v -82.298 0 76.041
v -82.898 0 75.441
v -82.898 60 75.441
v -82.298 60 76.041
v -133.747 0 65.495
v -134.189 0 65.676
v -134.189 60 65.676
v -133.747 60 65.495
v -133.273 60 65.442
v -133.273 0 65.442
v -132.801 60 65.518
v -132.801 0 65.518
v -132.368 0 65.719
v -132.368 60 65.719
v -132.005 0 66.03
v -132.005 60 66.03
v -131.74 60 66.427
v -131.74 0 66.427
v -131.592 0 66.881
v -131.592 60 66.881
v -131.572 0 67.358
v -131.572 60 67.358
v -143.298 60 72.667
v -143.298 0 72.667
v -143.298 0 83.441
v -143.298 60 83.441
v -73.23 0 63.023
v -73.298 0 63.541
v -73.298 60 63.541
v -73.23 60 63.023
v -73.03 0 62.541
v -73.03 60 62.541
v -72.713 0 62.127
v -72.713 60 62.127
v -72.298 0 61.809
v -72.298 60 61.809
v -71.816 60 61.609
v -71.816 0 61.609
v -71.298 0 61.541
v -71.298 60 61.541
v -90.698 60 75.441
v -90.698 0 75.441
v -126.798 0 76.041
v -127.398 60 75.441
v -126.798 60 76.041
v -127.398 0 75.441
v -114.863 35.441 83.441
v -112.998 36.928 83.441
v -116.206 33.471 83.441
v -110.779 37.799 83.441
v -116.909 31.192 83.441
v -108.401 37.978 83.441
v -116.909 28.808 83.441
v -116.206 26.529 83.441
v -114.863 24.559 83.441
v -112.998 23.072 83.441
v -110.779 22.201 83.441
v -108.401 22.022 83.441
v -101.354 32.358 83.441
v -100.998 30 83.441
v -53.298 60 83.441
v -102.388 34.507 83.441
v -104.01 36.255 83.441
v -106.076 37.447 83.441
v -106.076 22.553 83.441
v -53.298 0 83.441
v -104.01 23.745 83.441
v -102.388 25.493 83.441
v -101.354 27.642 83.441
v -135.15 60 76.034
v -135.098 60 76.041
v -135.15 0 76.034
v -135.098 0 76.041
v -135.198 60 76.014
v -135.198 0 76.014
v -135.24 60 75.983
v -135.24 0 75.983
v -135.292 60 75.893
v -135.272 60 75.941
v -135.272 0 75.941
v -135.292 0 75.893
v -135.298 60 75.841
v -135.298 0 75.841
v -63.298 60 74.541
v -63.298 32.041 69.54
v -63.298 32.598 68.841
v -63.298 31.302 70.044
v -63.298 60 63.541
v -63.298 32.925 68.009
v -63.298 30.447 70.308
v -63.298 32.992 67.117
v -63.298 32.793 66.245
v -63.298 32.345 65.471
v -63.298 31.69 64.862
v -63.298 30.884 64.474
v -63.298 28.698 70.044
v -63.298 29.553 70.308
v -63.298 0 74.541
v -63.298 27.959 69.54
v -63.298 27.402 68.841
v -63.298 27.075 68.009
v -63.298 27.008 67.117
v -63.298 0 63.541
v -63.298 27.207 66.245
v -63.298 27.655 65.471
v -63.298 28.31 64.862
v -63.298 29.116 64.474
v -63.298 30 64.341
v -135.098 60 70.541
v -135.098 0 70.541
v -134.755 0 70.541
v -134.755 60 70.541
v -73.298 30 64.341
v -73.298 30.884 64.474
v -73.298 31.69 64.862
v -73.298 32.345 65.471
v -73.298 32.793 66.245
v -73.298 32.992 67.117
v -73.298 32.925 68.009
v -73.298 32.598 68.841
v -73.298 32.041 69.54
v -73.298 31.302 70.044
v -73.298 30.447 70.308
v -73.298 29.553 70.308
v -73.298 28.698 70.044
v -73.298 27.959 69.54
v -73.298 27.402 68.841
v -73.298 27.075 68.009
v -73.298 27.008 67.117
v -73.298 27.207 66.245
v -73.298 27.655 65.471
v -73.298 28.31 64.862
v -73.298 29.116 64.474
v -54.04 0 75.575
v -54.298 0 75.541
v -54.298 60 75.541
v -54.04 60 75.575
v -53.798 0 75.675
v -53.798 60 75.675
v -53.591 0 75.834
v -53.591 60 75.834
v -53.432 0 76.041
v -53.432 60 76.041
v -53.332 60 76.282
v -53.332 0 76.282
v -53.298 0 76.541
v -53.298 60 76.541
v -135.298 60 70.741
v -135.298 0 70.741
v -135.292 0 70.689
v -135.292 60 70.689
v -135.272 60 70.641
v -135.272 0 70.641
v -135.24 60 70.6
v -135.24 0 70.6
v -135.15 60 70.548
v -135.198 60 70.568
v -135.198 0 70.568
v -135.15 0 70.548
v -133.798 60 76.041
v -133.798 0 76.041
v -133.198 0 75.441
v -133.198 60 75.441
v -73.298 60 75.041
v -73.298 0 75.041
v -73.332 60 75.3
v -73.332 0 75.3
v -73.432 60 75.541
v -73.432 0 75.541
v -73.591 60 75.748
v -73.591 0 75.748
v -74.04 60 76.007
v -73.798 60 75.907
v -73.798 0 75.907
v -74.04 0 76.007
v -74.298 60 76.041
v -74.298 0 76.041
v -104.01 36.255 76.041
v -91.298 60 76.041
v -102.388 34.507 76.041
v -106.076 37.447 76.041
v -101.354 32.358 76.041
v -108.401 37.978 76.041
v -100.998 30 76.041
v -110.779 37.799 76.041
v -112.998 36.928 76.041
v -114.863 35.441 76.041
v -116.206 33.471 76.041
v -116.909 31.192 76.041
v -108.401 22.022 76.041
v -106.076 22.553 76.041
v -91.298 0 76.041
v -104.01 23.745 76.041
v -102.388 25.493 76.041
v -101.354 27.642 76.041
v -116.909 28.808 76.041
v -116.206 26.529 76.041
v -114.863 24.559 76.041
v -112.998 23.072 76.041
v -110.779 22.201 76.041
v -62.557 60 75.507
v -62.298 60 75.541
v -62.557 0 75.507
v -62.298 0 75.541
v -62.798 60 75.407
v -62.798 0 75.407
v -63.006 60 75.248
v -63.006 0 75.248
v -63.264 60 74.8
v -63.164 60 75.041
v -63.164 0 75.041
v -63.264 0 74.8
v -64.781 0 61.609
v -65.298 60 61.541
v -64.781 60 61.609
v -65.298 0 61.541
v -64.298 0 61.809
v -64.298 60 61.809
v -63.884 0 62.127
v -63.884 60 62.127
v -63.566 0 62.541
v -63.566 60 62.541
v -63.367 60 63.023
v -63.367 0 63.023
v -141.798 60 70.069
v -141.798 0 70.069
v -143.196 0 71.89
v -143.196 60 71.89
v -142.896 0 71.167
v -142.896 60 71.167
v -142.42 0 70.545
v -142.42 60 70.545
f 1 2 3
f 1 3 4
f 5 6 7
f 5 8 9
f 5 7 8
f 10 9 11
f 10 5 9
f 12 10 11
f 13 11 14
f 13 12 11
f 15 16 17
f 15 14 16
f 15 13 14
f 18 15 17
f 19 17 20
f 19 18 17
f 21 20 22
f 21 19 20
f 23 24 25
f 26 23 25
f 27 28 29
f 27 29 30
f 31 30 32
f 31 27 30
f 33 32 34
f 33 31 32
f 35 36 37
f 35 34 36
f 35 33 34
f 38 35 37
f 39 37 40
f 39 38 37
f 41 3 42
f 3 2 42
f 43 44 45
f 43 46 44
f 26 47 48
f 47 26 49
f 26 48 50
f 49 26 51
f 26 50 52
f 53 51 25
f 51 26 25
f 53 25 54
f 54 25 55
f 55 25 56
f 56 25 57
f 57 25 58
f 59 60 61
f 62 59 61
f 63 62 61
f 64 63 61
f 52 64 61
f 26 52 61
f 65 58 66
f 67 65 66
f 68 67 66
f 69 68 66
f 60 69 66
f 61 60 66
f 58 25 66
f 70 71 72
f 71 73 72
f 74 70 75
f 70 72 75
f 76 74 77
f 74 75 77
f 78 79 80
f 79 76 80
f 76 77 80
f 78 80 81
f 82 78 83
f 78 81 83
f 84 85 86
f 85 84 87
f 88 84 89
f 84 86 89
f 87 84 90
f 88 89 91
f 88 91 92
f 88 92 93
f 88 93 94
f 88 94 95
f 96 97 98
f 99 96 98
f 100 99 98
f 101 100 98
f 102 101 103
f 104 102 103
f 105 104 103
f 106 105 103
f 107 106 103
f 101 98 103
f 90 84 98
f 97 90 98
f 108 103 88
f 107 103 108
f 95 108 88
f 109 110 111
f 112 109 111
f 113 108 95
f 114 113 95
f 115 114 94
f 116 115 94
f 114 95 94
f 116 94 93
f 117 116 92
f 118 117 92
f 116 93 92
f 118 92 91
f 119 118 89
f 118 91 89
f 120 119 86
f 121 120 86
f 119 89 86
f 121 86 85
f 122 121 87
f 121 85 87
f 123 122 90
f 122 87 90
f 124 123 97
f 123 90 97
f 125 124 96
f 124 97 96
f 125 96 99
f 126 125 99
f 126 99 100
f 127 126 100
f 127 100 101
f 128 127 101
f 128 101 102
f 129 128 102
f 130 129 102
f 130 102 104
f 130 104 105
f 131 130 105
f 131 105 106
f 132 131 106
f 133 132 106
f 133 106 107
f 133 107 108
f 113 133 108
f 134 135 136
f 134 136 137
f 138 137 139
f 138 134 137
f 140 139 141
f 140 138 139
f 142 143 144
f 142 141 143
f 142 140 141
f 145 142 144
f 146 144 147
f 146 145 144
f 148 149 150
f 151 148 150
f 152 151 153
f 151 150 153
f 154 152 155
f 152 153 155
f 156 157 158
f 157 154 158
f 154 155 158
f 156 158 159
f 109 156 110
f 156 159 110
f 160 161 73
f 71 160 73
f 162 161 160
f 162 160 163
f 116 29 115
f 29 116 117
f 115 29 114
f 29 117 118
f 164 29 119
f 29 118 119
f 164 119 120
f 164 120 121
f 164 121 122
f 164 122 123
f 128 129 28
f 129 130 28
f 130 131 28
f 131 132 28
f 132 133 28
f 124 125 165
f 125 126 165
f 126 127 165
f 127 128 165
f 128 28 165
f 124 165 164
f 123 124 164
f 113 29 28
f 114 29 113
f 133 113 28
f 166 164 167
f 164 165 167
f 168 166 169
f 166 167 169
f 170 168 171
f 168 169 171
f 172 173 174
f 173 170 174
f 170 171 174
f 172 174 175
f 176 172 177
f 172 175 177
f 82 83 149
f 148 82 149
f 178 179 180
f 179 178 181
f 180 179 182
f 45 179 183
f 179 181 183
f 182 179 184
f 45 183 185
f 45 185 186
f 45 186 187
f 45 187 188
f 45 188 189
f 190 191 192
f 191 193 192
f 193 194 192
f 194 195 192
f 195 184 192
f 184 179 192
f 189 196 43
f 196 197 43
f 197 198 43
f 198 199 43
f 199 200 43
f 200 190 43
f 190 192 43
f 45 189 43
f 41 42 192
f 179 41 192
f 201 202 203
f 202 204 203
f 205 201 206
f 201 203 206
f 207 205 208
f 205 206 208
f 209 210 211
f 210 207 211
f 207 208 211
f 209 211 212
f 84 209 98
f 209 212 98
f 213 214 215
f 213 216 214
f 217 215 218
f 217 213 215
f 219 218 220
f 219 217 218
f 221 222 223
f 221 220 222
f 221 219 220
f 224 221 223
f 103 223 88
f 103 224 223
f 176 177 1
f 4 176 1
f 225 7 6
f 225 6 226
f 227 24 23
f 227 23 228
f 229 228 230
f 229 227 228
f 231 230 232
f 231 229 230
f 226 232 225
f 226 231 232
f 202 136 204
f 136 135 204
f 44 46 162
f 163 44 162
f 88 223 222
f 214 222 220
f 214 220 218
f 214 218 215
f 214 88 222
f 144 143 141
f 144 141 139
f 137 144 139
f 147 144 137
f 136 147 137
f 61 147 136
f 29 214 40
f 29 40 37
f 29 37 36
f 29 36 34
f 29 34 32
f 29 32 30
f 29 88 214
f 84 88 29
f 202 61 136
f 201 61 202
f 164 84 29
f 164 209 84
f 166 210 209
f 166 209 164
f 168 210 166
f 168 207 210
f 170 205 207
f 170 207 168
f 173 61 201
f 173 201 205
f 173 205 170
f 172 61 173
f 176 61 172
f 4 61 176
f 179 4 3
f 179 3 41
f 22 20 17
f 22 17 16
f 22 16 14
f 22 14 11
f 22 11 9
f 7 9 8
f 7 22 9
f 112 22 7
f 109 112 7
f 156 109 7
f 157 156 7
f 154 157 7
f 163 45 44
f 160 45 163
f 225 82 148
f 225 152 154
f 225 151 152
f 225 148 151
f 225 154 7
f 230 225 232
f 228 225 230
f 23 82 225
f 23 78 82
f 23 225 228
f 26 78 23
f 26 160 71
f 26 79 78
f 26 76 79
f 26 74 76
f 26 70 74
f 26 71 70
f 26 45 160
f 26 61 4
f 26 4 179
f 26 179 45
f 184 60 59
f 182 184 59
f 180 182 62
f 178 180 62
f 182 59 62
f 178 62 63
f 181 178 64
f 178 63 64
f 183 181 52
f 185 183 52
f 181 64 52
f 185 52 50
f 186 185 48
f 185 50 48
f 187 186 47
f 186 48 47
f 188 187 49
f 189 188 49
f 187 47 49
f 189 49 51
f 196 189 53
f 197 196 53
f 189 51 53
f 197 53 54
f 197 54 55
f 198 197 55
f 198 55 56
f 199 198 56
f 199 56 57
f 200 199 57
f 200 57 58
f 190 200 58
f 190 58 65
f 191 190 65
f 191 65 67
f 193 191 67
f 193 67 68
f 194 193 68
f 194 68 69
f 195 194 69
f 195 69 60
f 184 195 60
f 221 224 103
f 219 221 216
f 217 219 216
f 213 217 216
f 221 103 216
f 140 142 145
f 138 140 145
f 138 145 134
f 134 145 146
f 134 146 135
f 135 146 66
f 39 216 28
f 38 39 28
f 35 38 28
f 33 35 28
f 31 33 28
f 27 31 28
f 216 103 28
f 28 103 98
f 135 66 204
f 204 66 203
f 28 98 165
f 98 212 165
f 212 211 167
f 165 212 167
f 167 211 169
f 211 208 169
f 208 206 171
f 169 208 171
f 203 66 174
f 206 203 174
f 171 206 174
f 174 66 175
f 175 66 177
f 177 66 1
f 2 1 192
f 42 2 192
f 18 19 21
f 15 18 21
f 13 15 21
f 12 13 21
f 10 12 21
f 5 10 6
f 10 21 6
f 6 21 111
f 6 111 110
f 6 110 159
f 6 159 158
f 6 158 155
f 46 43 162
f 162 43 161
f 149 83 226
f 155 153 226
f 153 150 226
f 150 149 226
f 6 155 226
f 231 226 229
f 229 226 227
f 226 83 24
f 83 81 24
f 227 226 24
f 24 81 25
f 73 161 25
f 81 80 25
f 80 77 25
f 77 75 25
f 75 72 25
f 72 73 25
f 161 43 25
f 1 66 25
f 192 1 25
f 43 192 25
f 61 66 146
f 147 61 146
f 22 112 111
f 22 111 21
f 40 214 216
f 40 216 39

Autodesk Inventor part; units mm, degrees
ref_plane "YZ Plane" through (0, 0, 0) normal (1, 0, 0) x (0, 1, 0)
ref_plane "XZ Plane" through (0, 0, 0) normal (0, 1, 0) x (-1, 0, 0)
ref_plane "XY Plane" through (0, 0, 0) normal (0, 0, 1) x (1, 0, 0)
sketch "スケッチ1" plane through (0, 0, 0) normal (0, 1, 0) x (-1, 0, 0)
  line L0 (-49.8489, 61.5411) -> (-49.8489, 83.4411)
  line L1 (-49.8489, 83.4411) -> (10.1511, 83.4411)
  line L2 (10.1511, 83.4411) -> (10.1511, 61.5411)
  line L3 (10.1511, 61.5411) -> (-8.8489, 61.5411)
  line L4 (-8.8489, 56.3412) -> (-8.8489, 74.3411)
  line L5 (-8.8489, 74.3411) -> (-15.9758, 74.3411)
  line L6 (-23.7218, 74.3411) -> (-30.8489, 74.3411)
  line L7 (-30.8489, 74.3411) -> (-30.8489, 56.3412)
  line L8 (-30.8489, 56.3411) -> (-8.8489, 56.3411)
  circle A0 centre (-19.8489, 67.3411) radius 8
  circle A1 centre (-19.8489, 67.3411) radius 7.5
  line L9 (-30.8489, 61.5411) -> (-49.8489, 61.5411)
  line L10 (-49.8489, 75.5411) -> (10.1511, 75.5411)
  line L11 (53.2984, 117.706) -> (53.2984, 177.706)
  line L12 (53.2984, 177.706) -> (143.2984, 177.706)
  line L13 (143.2984, 177.706) -> (143.2984, 117.706)
  line L14 (143.2984, 117.706) -> (53.2984, 117.706)
  circle A2 centre (83.9984, 122.706) radius 1.5
  circle A3 centre (83.9984, 147.706) radius 1.5
  circle A4 centre (93.9984, 147.706) radius 2.25
  circle A5 centre (83.9984, 172.706) radius 1.5
  circle A6 centre (108.9984, 172.706) radius 1.5
  circle A7 centre (133.9984, 172.706) radius 1.5
  circle A8 centre (133.9984, 147.706) radius 1.5
  circle A9 centre (123.9984, 147.706) radius 2.25
  circle A10 centre (108.9984, 147.706) radius 7.5
  circle A11 centre (108.9984, 122.706) radius 1.5
  circle A12 centre (133.9984, 122.706) radius 1.5
  line L15 (174.3262, 83.4411) -> (174.3262, 61.5411)
  line L16 (174.3262, 61.5411) -> (193.3262, 61.5411)
  line L17 (193.3262, 65.4411) -> (193.3262, 56.3412)
  line L18 (193.3262, 56.3411) -> (215.3262, 56.3411)
  line L19 (215.3262, 56.3412) -> (215.3262, 65.4411)
  line L20 (215.3262, 61.5411) -> (234.3263, 61.5411)
  line L21 (234.3263, 61.5411) -> (234.3263, 83.4411)
  line L22 (234.3263, 83.4411) -> (174.3262, 83.4411)
  line L23 (234.3263, 65.4411) -> (174.3262, 65.4411)
  line L24 (143.2984, 25.0403) -> (53.2984, 25.0403)
  line L25 (53.2984, 25.0403) -> (53.2984, -34.9597)
  line L26 (53.2984, -34.9597) -> (143.2984, -34.9597)
  line L27 (143.2984, -34.9597) -> (143.2984, 25.0403)
  line L28 (131.5644, 25.0403) -> (131.5644, -34.9597)
  circle A13 centre (108.9984, -29.9597) radius 1.5
  circle A14 centre (108.9984, -4.9597) radius 7.5
  circle A15 centre (123.9984, -4.9597) radius 2.25
  circle A16 centre (123.9984, -4.9597) radius 4
  circle A17 centre (108.9984, 20.0403) radius 1.5
  circle A18 centre (83.9984, 20.0403) radius 1.5
  line L29 (73.2984, 25.0403) -> (73.2984, 6.0403)
  line L30 (86.3001, -15.9597) -> (86.3001, 6.0403)
  line L31 (86.3001, 6.0403) -> (53.3001, 6.0403)
  line L32 (53.3001, 6.0403) -> (53.3001, -15.9597)
  line L33 (53.3001, -15.9597) -> (86.3001, -15.9597)
  line L34 (73.2984, -15.9597) -> (73.2984, -34.9597)
  line L35 (63.2984, -34.9597) -> (63.2984, -15.9597)
  line L36 (63.2984, 6.0403) -> (63.2984, 25.0403)
  circle A19 centre (83.9984, -29.9597) radius 1.5
  circle A20 centre (93.9984, -4.9597) radius 2.25
  circle A21 centre (93.9984, -4.9597) radius 4
  line L37 (-19.8489, 49.2711) -> (-19.8489, 87.2696)
  line L38 (-6.1616, 67.3411) -> (-35.9585, 67.3411)
  line L39 (83.9984, 23.5784) -> (83.9984, 16.5836)
  circle A22 centre (83.9984, 20.0403) radius 2
  line L40 (80.6576, 20.0403) -> (87.5893, 20.0403)
  line L41 (93.9984, 1.0394) -> (93.9984, -10.6526)
  line L42 (83.9984, -26.503) -> (83.9984, -33.4978)
  circle A23 centre (83.9984, -29.9597) radius 2
  line L43 (80.6576, -29.9597) -> (87.5893, -29.9597)
  line L44 (29.8273, -4.9597) -> (148.6488, -4.9597)
  line L45 (123.9984, -10.6526) -> (123.9984, 1.0394)
  line L46 (112.4368, 20.0403) -> (105.6741, 20.0403)
  circle A24 centre (108.9984, 20.0403) radius 2
  line L47 (108.9984, 32.4142) -> (108.9984, -41.5197)
  circle A25 centre (108.9984, -29.9597) radius 2
  line L48 (105.4074, -29.9597) -> (112.8092, -29.9597)
  circle A26 centre (108.9984, -4.9597) radius 8
  line L49 (108.9984, 111.8823) -> (108.9984, 183.8068)
  circle A27 centre (108.9984, 172.706) radius 2
  line L50 (105.6741, 172.706) -> (112.4368, 172.706)
  line L51 (130.4749, 172.706) -> (137.3391, 172.706)
  circle A28 centre (133.9984, 172.706) radius 2
  line L52 (133.9984, 169.2493) -> (133.9984, 176.2441)
  line L53 (123.9984, 153.3988) -> (123.9984, 141.7069)
  circle A29 centre (123.9984, 147.706) radius 4
  circle A30 centre (133.9984, 147.706) radius 2
  line L54 (133.9984, 151.0572) -> (133.9984, 144.2493)
  line L55 (148.6488, 147.706) -> (29.8273, 147.706)
  circle A31 centre (83.9984, 147.706) radius 2
  line L56 (83.9984, 151.0572) -> (83.9984, 144.2493)
  line L57 (93.9984, 141.7069) -> (93.9984, 153.3988)
  circle A32 centre (93.9984, 147.706) radius 4
  line L58 (83.9984, 169.2493) -> (83.9984, 176.2441)
  circle A33 centre (83.9984, 172.706) radius 2
  line L59 (80.6576, 172.706) -> (87.5893, 172.706)
  circle A34 centre (108.9984, 147.706) radius 8
  circle A35 centre (108.9984, 122.706) radius 2
  line L60 (105.4074, 122.706) -> (112.8092, 122.706)
  line L61 (130.8446, 122.706) -> (137.3391, 122.706)
  circle A36 centre (133.9984, 122.706) radius 2
  line L62 (133.9984, 126.1627) -> (133.9984, 119.1679)
  line L63 (87.5893, 122.706) -> (80.6576, 122.706)
  circle A37 centre (83.9984, 122.706) radius 2
  line L64 (83.9984, 126.1627) -> (83.9984, 119.1679)
  line L65 (204.3262, 87.2696) -> (204.3262, 49.2711)
  line L66 (176.3262, 70.0686) -> (232.3263, 70.0686)
  line L67 (82.1365, 4.0403) -> (82.1365, -13.9597)
  line L68 (51.8001, 144.706) -> (51.8001, 150.706)
  line L69 (53.2984, 150.706) -> (51.8001, 150.706)
  line L70 (53.2984, 144.706) -> (51.8001, 144.706)
  line L71 (33.8001, 155.206) -> (33.8001, 140.206)
  line L72 (33.8001, 140.206) -> (34.3001, 139.706)
  line L73 (34.3001, 139.706) -> (51.3001, 139.706)
  line L74 (51.3001, 139.706) -> (51.8001, 140.206)
  line L75 (51.8001, 140.206) -> (51.8001, 155.206)
  line L76 (51.8001, 155.206) -> (51.3001, 155.706)
  line L77 (51.3001, 155.706) -> (34.3001, 155.706)
  line L78 (34.3001, 155.706) -> (33.8001, 155.206)
  line L79 (34.3001, 155.706) -> (34.3001, 139.706)
  line L80 (51.3001, 139.706) -> (51.3001, 155.706)
  line L81 (51.8001, -7.9597) -> (51.8001, -1.9597)
  line L82 (53.3001, -1.9597) -> (51.8001, -1.9597)
  line L83 (53.3001, -7.9597) -> (51.8001, -7.9597)
  line L84 (33.8001, 2.5403) -> (33.8001, -12.4597)
  line L85 (33.8001, -12.4597) -> (34.3001, -12.9597)
  line L86 (34.3001, -12.9597) -> (51.3001, -12.9597)
  line L87 (51.3001, -12.9597) -> (51.8001, -12.4597)
  line L88 (51.8001, -12.4597) -> (51.8001, 2.5403)
  line L89 (51.8001, 2.5403) -> (51.3001, 3.0403)
  line L90 (51.3001, 3.0403) -> (34.3001, 3.0403)
  line L91 (34.3001, 3.0403) -> (33.8001, 2.5403)
  line L92 (34.3001, 3.0403) -> (34.3001, -12.9597)
  line L93 (51.3001, -12.9597) -> (51.3001, 3.0403)
  line L94 (28.0972, 67.3411) -> (83.3407, 67.3411)
  line L95 (82.8984, 75.4411) -> (90.6984, 75.4411)
  line L96 (127.3984, 75.4411) -> (133.1984, 75.4411)
  line L97 (134.7552, 70.5411) -> (131.5724, 67.3583)
  line L98 (82.4415, 71.3411) -> (86.3001, 67.4825)
  line L99 (78.3001, 69.4911) -> (75.8001, 69.4911)
  line L100 (78.3001, 65.1911) -> (75.8001, 65.1911)
  line L101 (75.8001, 64.8411) -> (75.8001, 69.8411)
  line L102 (75.3001, 70.3411) -> (73.1569, 70.3411)
  line L103 (75.3001, 64.3411) -> (73.1569, 64.3411)
  line L104 (75.8001, 69.8411) -> (73.1569, 69.8411)
  line L105 (75.8001, 64.8411) -> (73.1569, 64.8411)
  line L106 (51.8001, 64.3411) -> (51.8001, 70.3411)
  line L107 (53.3001, 70.3411) -> (51.8001, 70.3411)
  line L108 (53.3001, 64.3411) -> (51.8001, 64.3411)
  line L109 (33.8001, 74.8411) -> (33.8001, 59.8411)
  line L110 (33.8001, 59.8411) -> (34.3001, 59.3411)
  line L111 (34.3001, 59.3411) -> (51.3001, 59.3411)
  line L112 (51.3001, 59.3411) -> (51.8001, 59.8411)
  line L113 (51.8001, 59.8411) -> (51.8001, 74.8411)
  line L114 (51.8001, 74.8411) -> (51.3001, 75.3411)
  line L115 (51.3001, 75.3411) -> (34.3001, 75.3411)
  line L116 (34.3001, 75.3411) -> (33.8001, 74.8411)
  line L117 (34.3001, 75.3411) -> (34.3001, 59.3411)
  line L118 (51.3001, 59.3411) -> (51.3001, 75.3411)
  line L119 (54.3001, 74.3411) -> (60.3001, 74.3411)
  line L120 (54.3001, 56.3411) -> (80.2082, 56.3411)
  line L121 (53.3001, 57.3411) -> (53.3001, 73.3411)
  line L122 (86.3001, 60.5366) -> (86.3001, 67.4825)
  line L123 (61.3001, 62.3411) -> (61.3001, 73.3411)
  line L124 (62.3001, 61.3411) -> (77.3001, 61.3411)
  line L125 (78.3001, 62.3411) -> (78.3001, 70.3411)
  line L126 (79.3001, 71.3411) -> (82.4415, 71.3411)
  line L127 (82.1365, 57.0429) -> (86.3001, 60.5366)
  arc A38 (80.2082, 56.3411) -> (82.1365, 57.0429) centre (80.2082, 59.3411) ccw
  arc A39 (54.3001, 74.3411) -> (53.3001, 73.3411) centre (54.3001, 73.3411) ccw
  arc A40 (61.3001, 73.3411) -> (60.3001, 74.3411) centre (60.3001, 73.3411) ccw
  arc A41 (53.3001, 57.3411) -> (54.3001, 56.3411) centre (54.3001, 57.3411) ccw
  arc A42 (61.3001, 62.3411) -> (62.3001, 61.3411) centre (62.3001, 62.3411) ccw
  arc A43 (77.3001, 61.3411) -> (78.3001, 62.3411) centre (77.3001, 62.3411) ccw
  arc A44 (79.3001, 71.3411) -> (78.3001, 70.3411) centre (79.3001, 70.3411) ccw
  line L128 (63.1569, 70.3411) -> (61.3001, 70.3411)
  line L129 (63.1569, 69.8411) -> (61.3001, 69.8411)
  line L130 (63.1569, 64.8411) -> (61.3001, 64.8411)
  line L131 (63.1569, 64.3411) -> (61.3001, 64.3411)
  line L132 (75.3001, 70.3411) -> (75.8001, 69.8411)
  line L133 (75.3001, 64.3411) -> (75.8001, 64.8411)
  arc A45 (63.2984, 63.5411) -> (65.2984, 61.5411) centre (65.2984, 63.5411) ccw
  line L134 (65.2984, 61.5411) -> (71.2984, 61.5411)
  arc A46 (71.2984, 61.5411) -> (73.2984, 63.5411) centre (71.2984, 63.5411) ccw
  line L135 (73.2984, 63.5411) -> (73.2984, 75.0411)
  line L136 (135.2984, 75.8411) -> (135.2984, 70.7411)
  line L137 (143.2984, 72.6666) -> (143.2984, 83.4411)
  line L138 (143.2984, 83.4411) -> (53.2984, 83.4411)
  line L139 (53.2984, 83.4411) -> (53.2984, 76.5411)
  arc A47 (53.2984, 76.5411) -> (54.2984, 75.5411) centre (54.2984, 76.5411) ccw
  line L140 (54.2984, 75.5411) -> (62.2984, 75.5411)
  arc A48 (63.2984, 74.5411) -> (62.2984, 75.5411) centre (62.2984, 74.5411) ccw
  line L141 (63.2984, 74.5411) -> (63.2984, 63.5411)
  line L142 (74.2984, 76.0411) -> (82.2984, 76.0411)
  line L143 (133.7984, 76.0411) -> (133.1984, 75.4411)
  line L144 (127.3984, 75.4411) -> (126.7984, 76.0411)
  line L145 (90.6984, 75.4411) -> (91.2984, 76.0411)
  line L146 (82.8984, 75.4411) -> (82.2984, 76.0411)
  line L147 (91.2984, 76.0411) -> (126.7984, 76.0411)
  arc A49 (74.2984, 76.0411) -> (73.2984, 75.0411) centre (74.2984, 75.0411) ccw
  line L148 (133.7984, 76.0411) -> (135.0984, 76.0411)
  arc A50 (135.2984, 75.8411) -> (135.0984, 76.0411) centre (135.0984, 75.8411) ccw
  line L149 (135.0984, 70.5411) -> (134.7552, 70.5411)
  arc A51 (135.0984, 70.5411) -> (135.2984, 70.7411) centre (135.0984, 70.7411) ccw
  arc A52 (131.5724, 67.3583) -> (134.1894, 65.6755) centre (133.3144, 67.1911) ccw
  line L150 (134.1894, 65.6755) -> (141.7984, 70.0686)
  arc A53 (141.7984, 70.0686) -> (143.2984, 72.6666) centre (140.2984, 72.6666) ccw
  line L151 (124.9984, 127.8911) -> (124.9984, 123.5209)
  line L152 (127.1835, 125.706) -> (122.8133, 125.706)
  circle A54 centre (124.9984, 125.706) radius 1
  circle A55 centre (124.9984, 125.706) radius 1.5
  line L153 (124.9984, 167.5209) -> (124.9984, 171.8911)
  line L154 (127.1835, 169.706) -> (122.8133, 169.706)
  circle A56 centre (124.9984, 169.706) radius 1
  circle A57 centre (124.9984, 169.706) radius 1.5
  line L155 (58.9984, 127.8911) -> (58.9984, 123.5209)
  line L156 (61.1835, 125.706) -> (56.8133, 125.706)
  circle A58 centre (58.9984, 125.706) radius 1
  circle A59 centre (58.9984, 125.706) radius 1.5
  line L157 (58.9984, 167.5209) -> (58.9984, 171.8911)
  line L158 (61.1835, 169.706) -> (56.8133, 169.706)
  circle A60 centre (58.9984, 169.706) radius 1
  circle A61 centre (58.9984, 169.706) radius 1.5
  line L159 (34.3001, 154.706) -> (49.1751, 154.706)
  line L160 (34.3001, 153.706) -> (47.0501, 153.706)
  line L161 (34.3001, 152.706) -> (44.9251, 152.706)
  line L162 (34.3001, 151.706) -> (42.8001, 151.706)
  line L163 (34.3001, 150.706) -> (40.6751, 150.706)
  line L164 (34.3001, 149.706) -> (38.5501, 149.706)
  line L165 (34.3001, 148.706) -> (36.4251, 148.706)
  line L166 (34.3001, 2.0403) -> (49.1751, 2.0403)
  line L167 (34.3001, 1.0403) -> (47.0501, 1.0403)
  line L168 (34.3001, 0.0403) -> (44.9251, 0.0403)
  line L169 (34.3001, -0.9597) -> (42.8001, -0.9597)
  line L170 (34.3001, -1.9597) -> (40.6751, -1.9597)
  line L171 (34.3001, -2.9597) -> (38.5501, -2.9597)
  line L172 (34.3001, -3.9597) -> (36.4251, -3.9597)
  line L173 (108.9984, 51.8579) -> (108.9984, 88.7279)
  line L174 (34.3001, 74.3411) -> (49.1751, 74.3411)
  line L175 (34.3001, 73.3411) -> (47.0501, 73.3411)
  line L176 (34.3001, 72.3411) -> (44.9251, 72.3411)
  line L177 (34.3001, 71.3411) -> (42.8001, 71.3411)
  line L178 (34.3001, 70.3411) -> (40.6751, 70.3411)
  line L179 (34.3001, 69.3411) -> (38.5501, 69.3411)
  line L180 (34.3001, 68.3411) -> (36.4251, 68.3411)
  point P0 (0, 0)
  point P1 (209.8216, -24.5126)
  point P2 (209.8216, -11.7034)
  point P3 (131.5724, 67.3583)
  point P4 (134.1894, 65.6755)
  point P5 (141.7984, 70.0686)
  point P6 (54.2984, 75.5411)
  point P7 (63.2984, 67.3411)
  point P8 (73.2984, 67.3411)
extrude "押し出し1" add sketch "スケッチ1" along normal blind 60 contours L141 A48 L140 A47 L139 L138 L173 L147 L145 L95 L146 L142 A49 L135 L94 | L94 L135 A46 L134 A45 L141 | L138 L137 A53 L150 A52 L97 L149 A51 L136 A50 L148 L143 L96 L144 L147 L173
sketch "スケッチ2" plane through (-143.2984, 0, 83.4411) normal (0, 0, 1) x (1, 0, 0)
  line L0 (0, 0) -> (0, 60) projected
  line L1 (0, 30) -> (34.3, 30) construction
  circle A0 centre (34.3, 30) radius 8
  point P0 (143.2984, 0)
  dimension "d2" = 34.3
  dimension "d3" = 16
extrude "押し出し2" cut sketch "スケッチ2" against normal through all
thread "ねじ1" size "M16x2" class "6H" standard "ANSI Metric M Profile" full length
sketch "スケッチ4" plane through (-63.2984, 0, 74.5411) normal (1, 0, 0) x (0, 0, -1)
  line L0 (13, 0) -> (13, 60) projected
  line L1 (13, 30) -> (7.2, 30) construction
  circle A0 centre (7.2, 30) radius 3
  point P0 (74.5411, 0)
  dimension "d14" = 5.8
  dimension "d15" = 6
extrude "押し出し4" cut sketch "スケッチ4" against normal blind 10
thread "ねじ3" size "M6x1" class "6H" standard "ANSI Metric M Profile" full length
properties part number "caria_base" material "UHMW、黒"
